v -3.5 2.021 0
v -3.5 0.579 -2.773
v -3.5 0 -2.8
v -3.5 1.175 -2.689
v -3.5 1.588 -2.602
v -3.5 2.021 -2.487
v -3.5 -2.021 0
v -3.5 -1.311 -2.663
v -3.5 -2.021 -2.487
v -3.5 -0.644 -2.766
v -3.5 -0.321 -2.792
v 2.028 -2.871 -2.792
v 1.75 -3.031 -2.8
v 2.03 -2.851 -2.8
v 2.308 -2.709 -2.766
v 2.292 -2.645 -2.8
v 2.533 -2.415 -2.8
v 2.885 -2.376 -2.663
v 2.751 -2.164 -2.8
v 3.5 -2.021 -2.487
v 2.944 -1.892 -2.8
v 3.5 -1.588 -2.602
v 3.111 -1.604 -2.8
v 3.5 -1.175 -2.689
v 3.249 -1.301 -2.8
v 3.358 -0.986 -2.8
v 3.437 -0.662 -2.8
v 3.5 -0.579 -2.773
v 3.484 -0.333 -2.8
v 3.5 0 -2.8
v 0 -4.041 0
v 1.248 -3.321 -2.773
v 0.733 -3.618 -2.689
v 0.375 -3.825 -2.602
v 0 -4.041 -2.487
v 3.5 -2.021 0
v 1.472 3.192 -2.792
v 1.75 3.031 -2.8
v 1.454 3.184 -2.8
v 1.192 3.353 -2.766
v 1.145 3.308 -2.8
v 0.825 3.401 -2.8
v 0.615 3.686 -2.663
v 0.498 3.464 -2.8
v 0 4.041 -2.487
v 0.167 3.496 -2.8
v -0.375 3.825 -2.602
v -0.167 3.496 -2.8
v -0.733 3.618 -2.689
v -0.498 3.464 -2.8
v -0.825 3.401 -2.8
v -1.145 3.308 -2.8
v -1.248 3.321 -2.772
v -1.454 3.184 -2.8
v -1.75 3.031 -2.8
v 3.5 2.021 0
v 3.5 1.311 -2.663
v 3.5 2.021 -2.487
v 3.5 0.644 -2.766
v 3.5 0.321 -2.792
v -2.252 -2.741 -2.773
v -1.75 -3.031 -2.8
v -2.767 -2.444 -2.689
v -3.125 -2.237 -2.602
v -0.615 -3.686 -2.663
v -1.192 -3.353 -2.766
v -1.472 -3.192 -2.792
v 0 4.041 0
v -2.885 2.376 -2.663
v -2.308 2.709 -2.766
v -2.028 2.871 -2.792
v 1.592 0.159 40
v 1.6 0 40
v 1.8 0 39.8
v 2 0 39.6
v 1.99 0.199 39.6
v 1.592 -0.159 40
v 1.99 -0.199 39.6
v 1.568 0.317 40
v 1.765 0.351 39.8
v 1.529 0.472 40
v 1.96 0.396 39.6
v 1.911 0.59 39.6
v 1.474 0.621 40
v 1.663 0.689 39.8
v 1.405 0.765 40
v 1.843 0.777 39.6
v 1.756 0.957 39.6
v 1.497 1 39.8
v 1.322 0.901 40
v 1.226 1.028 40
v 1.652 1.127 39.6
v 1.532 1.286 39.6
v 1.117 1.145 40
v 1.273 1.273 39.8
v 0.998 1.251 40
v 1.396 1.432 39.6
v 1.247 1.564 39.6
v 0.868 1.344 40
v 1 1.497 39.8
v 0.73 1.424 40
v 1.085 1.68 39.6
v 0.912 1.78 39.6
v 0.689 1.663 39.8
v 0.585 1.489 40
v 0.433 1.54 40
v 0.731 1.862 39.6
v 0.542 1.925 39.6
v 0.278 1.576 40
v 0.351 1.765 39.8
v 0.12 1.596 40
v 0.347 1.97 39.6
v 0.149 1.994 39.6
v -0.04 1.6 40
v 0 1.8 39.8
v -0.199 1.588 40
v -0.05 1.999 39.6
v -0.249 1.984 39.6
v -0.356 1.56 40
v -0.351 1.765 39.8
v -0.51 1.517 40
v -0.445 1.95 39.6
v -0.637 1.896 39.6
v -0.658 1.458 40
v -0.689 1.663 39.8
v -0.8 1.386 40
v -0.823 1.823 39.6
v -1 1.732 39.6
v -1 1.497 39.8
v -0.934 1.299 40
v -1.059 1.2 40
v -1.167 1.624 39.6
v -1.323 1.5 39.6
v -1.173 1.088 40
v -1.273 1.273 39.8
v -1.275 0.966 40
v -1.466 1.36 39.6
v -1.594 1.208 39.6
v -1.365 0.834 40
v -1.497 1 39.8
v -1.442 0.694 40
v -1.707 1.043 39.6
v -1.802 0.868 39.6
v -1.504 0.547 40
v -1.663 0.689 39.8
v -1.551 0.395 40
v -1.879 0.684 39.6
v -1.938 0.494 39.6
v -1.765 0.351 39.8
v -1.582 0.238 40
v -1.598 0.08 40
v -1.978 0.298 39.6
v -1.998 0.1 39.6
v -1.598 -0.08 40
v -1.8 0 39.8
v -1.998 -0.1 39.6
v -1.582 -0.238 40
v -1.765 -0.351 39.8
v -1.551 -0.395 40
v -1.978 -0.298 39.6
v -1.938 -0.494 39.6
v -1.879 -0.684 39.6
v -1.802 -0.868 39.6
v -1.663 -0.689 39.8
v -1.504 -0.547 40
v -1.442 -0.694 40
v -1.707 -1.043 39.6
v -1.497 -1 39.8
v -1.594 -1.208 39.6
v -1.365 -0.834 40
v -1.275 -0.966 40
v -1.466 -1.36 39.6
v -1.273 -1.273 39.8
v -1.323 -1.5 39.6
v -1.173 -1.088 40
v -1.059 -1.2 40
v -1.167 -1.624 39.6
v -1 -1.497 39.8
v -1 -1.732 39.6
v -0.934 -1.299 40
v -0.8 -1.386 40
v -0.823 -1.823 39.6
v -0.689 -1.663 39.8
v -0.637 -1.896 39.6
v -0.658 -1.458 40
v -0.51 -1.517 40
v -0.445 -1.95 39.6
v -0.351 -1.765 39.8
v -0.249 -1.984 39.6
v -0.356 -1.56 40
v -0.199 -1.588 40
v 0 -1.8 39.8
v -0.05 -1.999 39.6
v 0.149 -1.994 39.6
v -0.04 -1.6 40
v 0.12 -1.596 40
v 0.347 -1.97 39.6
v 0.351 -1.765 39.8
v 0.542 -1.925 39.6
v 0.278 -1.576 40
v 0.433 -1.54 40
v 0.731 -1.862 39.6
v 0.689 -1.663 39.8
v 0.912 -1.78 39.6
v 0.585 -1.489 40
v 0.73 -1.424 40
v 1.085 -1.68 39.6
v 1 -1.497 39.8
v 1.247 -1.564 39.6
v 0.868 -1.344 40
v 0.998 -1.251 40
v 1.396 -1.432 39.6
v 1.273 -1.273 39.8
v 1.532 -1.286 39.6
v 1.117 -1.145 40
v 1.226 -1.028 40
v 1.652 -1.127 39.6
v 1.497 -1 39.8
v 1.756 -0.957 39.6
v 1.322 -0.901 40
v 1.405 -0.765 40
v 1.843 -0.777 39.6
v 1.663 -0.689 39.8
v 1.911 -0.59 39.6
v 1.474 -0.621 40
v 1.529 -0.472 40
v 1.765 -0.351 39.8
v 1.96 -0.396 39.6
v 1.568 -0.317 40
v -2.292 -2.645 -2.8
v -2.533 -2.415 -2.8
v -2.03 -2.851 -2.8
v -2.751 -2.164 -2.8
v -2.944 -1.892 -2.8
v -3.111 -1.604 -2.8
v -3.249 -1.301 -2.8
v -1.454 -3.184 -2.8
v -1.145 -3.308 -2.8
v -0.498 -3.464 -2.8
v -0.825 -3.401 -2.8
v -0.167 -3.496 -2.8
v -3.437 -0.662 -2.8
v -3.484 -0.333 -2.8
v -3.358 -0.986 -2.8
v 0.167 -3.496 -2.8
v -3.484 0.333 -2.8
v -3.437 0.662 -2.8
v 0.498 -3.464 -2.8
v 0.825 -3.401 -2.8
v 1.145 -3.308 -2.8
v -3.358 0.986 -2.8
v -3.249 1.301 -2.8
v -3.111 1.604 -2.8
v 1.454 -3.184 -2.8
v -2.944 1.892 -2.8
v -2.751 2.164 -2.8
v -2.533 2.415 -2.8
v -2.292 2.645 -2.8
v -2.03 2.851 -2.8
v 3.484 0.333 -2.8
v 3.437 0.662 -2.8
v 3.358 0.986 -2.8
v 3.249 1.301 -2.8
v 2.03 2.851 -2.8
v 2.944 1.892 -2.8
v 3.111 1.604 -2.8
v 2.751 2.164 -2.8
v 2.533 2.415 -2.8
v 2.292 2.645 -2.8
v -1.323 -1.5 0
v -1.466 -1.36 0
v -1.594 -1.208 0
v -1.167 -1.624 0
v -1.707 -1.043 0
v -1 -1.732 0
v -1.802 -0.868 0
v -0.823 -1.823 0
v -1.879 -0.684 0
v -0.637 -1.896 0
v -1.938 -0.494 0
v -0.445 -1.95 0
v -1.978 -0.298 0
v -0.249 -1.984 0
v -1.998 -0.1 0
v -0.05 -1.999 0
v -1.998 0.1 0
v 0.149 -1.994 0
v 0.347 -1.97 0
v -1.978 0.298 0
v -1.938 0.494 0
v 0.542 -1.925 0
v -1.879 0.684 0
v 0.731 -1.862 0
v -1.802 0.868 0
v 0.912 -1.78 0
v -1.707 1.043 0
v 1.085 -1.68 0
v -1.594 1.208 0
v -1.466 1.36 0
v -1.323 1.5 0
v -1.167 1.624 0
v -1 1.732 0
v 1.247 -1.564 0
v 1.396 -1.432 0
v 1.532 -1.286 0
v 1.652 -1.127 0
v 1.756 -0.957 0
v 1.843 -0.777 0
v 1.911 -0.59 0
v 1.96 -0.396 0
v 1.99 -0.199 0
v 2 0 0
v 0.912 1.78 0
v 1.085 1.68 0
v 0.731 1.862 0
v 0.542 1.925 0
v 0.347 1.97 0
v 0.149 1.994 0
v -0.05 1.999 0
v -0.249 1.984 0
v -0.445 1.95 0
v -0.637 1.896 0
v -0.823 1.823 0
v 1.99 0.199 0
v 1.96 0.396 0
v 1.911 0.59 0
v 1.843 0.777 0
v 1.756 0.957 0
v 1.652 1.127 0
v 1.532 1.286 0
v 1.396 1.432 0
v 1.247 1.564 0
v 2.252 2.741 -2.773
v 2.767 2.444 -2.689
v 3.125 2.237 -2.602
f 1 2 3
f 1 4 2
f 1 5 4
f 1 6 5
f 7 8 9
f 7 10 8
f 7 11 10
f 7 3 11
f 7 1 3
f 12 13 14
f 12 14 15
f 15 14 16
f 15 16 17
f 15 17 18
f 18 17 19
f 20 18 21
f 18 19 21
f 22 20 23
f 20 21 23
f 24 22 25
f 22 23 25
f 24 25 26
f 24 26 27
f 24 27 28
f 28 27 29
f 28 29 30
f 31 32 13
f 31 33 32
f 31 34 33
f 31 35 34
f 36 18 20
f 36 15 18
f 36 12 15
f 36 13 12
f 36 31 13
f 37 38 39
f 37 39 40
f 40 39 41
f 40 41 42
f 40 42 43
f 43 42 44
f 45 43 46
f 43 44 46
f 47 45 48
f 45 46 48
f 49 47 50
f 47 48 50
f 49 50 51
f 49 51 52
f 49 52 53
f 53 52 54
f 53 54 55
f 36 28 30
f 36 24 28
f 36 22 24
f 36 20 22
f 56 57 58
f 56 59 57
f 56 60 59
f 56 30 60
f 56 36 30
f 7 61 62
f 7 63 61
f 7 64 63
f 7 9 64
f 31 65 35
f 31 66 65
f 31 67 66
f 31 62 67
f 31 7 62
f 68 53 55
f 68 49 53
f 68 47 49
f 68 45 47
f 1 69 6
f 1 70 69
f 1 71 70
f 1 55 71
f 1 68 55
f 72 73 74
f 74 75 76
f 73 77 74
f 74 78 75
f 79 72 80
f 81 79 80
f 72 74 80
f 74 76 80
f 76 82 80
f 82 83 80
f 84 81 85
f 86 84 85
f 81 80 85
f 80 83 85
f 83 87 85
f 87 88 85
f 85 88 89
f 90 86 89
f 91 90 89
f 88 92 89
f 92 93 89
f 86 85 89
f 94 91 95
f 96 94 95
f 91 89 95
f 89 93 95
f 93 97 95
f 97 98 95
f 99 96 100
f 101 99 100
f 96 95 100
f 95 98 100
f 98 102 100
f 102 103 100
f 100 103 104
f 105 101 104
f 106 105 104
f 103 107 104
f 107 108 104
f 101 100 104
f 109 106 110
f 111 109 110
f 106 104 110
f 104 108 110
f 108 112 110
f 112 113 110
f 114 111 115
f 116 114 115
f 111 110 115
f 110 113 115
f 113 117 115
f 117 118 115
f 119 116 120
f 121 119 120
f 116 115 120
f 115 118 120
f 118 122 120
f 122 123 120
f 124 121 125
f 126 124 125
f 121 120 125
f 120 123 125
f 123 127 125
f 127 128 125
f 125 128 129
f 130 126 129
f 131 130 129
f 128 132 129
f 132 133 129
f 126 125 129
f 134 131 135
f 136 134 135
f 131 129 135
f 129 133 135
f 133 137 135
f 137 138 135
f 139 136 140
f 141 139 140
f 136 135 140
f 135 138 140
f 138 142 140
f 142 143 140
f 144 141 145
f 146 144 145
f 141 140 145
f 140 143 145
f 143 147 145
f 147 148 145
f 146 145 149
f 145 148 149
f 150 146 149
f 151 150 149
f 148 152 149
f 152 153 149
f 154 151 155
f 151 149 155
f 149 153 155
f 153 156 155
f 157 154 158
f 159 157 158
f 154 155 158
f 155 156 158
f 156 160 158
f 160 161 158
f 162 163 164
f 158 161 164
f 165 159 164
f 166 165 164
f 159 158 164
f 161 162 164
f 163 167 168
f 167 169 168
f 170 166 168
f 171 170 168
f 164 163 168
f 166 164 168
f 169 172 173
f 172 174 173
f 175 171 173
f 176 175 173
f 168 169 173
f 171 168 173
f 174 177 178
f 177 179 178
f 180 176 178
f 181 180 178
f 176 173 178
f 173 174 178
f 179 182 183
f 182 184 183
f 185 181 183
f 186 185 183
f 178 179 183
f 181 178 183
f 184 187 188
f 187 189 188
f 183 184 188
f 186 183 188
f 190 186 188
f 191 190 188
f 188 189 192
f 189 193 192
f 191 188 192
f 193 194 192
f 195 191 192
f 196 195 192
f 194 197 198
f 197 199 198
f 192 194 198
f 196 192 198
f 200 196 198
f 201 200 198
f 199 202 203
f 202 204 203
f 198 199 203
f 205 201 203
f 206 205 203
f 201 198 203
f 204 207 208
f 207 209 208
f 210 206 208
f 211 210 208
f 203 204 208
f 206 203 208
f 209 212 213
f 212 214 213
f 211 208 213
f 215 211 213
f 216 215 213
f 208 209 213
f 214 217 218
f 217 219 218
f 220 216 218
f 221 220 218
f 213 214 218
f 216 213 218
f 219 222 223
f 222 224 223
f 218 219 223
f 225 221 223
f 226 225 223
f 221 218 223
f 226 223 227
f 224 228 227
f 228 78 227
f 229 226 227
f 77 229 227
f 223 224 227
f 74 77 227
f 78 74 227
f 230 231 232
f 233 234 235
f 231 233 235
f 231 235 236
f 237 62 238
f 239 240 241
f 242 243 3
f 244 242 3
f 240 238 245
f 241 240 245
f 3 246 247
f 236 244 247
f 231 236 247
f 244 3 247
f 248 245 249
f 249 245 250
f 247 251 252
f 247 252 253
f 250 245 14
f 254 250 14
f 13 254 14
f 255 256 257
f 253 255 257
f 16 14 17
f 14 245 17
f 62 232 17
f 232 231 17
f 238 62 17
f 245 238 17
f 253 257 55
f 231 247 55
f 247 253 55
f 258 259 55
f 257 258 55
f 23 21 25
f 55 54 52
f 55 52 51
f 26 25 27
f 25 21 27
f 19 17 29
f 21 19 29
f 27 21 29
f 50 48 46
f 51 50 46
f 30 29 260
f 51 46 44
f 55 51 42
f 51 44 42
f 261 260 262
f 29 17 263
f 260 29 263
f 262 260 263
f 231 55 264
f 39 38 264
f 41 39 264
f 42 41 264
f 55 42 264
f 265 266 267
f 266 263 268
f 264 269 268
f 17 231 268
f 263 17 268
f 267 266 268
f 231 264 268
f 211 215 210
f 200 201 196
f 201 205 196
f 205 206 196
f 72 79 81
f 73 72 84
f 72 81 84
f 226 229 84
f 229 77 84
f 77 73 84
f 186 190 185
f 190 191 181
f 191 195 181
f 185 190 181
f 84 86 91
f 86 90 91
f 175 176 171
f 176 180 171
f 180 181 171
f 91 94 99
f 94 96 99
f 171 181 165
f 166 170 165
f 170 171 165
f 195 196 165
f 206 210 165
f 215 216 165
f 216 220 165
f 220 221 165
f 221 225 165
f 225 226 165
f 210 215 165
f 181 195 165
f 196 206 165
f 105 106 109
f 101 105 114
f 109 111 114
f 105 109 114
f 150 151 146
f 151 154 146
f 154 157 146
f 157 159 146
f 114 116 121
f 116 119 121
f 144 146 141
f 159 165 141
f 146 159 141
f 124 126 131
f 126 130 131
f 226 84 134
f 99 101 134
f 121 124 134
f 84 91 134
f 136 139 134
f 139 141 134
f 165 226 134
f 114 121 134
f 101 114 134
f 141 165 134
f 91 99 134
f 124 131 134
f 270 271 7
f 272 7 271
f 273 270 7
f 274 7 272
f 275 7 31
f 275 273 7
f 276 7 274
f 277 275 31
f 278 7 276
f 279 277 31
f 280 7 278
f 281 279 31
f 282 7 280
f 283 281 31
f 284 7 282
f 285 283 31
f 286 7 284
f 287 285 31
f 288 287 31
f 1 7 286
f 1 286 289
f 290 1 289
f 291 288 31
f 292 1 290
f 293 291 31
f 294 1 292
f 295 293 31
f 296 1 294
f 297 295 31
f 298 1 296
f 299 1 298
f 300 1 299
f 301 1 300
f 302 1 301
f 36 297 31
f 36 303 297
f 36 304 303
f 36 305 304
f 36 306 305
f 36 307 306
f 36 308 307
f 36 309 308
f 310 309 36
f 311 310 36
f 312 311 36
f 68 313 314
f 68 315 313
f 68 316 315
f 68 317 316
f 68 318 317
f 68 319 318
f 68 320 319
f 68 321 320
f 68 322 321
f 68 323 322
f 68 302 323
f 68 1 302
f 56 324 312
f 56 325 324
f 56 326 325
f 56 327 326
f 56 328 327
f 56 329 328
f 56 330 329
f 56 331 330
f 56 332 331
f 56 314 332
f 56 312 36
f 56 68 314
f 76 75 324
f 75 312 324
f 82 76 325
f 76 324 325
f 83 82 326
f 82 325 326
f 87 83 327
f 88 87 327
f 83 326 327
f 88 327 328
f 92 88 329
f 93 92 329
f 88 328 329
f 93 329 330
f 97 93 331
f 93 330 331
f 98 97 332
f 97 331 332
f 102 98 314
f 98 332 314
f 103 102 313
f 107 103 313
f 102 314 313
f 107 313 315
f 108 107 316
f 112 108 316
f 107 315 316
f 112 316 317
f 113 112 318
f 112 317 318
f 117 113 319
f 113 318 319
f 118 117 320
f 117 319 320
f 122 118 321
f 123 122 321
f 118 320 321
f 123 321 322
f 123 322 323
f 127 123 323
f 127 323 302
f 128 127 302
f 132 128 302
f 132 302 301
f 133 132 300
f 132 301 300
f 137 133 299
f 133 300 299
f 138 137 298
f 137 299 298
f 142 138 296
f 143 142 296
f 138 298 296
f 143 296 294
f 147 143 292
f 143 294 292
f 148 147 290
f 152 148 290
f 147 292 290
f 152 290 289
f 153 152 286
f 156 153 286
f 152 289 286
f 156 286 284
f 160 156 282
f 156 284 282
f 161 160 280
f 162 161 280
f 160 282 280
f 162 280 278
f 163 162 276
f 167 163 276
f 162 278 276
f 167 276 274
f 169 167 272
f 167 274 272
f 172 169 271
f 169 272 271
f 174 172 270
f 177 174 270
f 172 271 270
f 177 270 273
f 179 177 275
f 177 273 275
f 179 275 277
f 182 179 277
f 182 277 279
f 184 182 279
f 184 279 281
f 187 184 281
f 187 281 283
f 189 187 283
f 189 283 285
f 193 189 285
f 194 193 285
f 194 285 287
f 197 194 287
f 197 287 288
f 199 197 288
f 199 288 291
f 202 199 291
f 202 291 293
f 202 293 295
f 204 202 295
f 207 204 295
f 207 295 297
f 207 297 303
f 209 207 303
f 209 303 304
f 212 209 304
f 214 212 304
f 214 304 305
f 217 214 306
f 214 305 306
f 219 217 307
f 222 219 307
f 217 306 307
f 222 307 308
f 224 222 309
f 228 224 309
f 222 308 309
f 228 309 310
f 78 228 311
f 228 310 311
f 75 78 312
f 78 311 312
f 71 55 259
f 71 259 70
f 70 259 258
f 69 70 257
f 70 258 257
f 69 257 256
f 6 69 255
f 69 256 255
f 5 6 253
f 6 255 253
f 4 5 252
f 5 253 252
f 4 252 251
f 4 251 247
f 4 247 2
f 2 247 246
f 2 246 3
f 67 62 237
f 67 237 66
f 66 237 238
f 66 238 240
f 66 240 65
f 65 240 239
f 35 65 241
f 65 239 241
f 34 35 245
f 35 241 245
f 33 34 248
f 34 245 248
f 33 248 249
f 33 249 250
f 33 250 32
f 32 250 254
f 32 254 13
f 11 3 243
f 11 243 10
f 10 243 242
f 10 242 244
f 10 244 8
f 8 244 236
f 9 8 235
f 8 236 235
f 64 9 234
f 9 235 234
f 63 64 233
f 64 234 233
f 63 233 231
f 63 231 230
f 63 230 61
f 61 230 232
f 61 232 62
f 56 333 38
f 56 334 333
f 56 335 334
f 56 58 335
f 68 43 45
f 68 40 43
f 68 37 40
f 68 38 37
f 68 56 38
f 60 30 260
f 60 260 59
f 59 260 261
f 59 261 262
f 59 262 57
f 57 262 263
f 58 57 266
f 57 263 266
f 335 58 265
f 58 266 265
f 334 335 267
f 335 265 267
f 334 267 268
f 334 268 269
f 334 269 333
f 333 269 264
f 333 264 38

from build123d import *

# Parameters (mm, degrees)
ESQUISSE1_W        = 2
ESQUISSE1_H        = 40
BOSS_EXTRU_1_DEPTH = 2.8


with BuildPart() as part:
    # Esquisse1 → Base-Révolution (revolve)
    with BuildSketch(Plane(origin=(0, 0, 0), x_dir=(1, 0, 0), z_dir=(0, 1, 0))):
        with Locations((1, -20)):
            Rectangle(ESQUISSE1_W, ESQUISSE1_H)
    revolve(axis=Axis((0, 0, 0), (0, 0, 1)))

    # Chanfrein1: read off the stored shape, not the designer's step
    # Chanfrein1 outline → Chanfrein1 (revolve, cut)
    with BuildSketch(Plane.XZ):
        Polygon((2, 40), (1.6, 40), (2, 39.6), align=None)
    revolve(axis=Axis((0, 0, 0), (0, 0, 1)), mode=Mode.SUBTRACT)

    # Esquisse6 → Boss.-Extru.1 (add)
    with BuildSketch(Plane.XY):
        Polygon((3.5, -2.020725942), (3.5, 2.020725942), (0, 4.041451884), (-3.5, 2.020725942), (-3.5, -2.020725942), (0, -4.041451884), align=None)
    extrude(amount=-BOSS_EXTRU_1_DEPTH)

    # Esquisse7 → Enlèvement de matière-Révolution1 (revolve, cut)
    with BuildSketch(Plane(origin=(0, 0, 0), x_dir=(1, 0, 0), z_dir=(0, 1, 0))):
        Polygon((-3.5, 2.8), (-8.349742261, 2.8), (-8.349742261, 0), align=None)
    revolve(axis=Axis((0, 0, -6.239446496), (0, 0, 1)), mode=Mode.SUBTRACT)


solid = part.part
